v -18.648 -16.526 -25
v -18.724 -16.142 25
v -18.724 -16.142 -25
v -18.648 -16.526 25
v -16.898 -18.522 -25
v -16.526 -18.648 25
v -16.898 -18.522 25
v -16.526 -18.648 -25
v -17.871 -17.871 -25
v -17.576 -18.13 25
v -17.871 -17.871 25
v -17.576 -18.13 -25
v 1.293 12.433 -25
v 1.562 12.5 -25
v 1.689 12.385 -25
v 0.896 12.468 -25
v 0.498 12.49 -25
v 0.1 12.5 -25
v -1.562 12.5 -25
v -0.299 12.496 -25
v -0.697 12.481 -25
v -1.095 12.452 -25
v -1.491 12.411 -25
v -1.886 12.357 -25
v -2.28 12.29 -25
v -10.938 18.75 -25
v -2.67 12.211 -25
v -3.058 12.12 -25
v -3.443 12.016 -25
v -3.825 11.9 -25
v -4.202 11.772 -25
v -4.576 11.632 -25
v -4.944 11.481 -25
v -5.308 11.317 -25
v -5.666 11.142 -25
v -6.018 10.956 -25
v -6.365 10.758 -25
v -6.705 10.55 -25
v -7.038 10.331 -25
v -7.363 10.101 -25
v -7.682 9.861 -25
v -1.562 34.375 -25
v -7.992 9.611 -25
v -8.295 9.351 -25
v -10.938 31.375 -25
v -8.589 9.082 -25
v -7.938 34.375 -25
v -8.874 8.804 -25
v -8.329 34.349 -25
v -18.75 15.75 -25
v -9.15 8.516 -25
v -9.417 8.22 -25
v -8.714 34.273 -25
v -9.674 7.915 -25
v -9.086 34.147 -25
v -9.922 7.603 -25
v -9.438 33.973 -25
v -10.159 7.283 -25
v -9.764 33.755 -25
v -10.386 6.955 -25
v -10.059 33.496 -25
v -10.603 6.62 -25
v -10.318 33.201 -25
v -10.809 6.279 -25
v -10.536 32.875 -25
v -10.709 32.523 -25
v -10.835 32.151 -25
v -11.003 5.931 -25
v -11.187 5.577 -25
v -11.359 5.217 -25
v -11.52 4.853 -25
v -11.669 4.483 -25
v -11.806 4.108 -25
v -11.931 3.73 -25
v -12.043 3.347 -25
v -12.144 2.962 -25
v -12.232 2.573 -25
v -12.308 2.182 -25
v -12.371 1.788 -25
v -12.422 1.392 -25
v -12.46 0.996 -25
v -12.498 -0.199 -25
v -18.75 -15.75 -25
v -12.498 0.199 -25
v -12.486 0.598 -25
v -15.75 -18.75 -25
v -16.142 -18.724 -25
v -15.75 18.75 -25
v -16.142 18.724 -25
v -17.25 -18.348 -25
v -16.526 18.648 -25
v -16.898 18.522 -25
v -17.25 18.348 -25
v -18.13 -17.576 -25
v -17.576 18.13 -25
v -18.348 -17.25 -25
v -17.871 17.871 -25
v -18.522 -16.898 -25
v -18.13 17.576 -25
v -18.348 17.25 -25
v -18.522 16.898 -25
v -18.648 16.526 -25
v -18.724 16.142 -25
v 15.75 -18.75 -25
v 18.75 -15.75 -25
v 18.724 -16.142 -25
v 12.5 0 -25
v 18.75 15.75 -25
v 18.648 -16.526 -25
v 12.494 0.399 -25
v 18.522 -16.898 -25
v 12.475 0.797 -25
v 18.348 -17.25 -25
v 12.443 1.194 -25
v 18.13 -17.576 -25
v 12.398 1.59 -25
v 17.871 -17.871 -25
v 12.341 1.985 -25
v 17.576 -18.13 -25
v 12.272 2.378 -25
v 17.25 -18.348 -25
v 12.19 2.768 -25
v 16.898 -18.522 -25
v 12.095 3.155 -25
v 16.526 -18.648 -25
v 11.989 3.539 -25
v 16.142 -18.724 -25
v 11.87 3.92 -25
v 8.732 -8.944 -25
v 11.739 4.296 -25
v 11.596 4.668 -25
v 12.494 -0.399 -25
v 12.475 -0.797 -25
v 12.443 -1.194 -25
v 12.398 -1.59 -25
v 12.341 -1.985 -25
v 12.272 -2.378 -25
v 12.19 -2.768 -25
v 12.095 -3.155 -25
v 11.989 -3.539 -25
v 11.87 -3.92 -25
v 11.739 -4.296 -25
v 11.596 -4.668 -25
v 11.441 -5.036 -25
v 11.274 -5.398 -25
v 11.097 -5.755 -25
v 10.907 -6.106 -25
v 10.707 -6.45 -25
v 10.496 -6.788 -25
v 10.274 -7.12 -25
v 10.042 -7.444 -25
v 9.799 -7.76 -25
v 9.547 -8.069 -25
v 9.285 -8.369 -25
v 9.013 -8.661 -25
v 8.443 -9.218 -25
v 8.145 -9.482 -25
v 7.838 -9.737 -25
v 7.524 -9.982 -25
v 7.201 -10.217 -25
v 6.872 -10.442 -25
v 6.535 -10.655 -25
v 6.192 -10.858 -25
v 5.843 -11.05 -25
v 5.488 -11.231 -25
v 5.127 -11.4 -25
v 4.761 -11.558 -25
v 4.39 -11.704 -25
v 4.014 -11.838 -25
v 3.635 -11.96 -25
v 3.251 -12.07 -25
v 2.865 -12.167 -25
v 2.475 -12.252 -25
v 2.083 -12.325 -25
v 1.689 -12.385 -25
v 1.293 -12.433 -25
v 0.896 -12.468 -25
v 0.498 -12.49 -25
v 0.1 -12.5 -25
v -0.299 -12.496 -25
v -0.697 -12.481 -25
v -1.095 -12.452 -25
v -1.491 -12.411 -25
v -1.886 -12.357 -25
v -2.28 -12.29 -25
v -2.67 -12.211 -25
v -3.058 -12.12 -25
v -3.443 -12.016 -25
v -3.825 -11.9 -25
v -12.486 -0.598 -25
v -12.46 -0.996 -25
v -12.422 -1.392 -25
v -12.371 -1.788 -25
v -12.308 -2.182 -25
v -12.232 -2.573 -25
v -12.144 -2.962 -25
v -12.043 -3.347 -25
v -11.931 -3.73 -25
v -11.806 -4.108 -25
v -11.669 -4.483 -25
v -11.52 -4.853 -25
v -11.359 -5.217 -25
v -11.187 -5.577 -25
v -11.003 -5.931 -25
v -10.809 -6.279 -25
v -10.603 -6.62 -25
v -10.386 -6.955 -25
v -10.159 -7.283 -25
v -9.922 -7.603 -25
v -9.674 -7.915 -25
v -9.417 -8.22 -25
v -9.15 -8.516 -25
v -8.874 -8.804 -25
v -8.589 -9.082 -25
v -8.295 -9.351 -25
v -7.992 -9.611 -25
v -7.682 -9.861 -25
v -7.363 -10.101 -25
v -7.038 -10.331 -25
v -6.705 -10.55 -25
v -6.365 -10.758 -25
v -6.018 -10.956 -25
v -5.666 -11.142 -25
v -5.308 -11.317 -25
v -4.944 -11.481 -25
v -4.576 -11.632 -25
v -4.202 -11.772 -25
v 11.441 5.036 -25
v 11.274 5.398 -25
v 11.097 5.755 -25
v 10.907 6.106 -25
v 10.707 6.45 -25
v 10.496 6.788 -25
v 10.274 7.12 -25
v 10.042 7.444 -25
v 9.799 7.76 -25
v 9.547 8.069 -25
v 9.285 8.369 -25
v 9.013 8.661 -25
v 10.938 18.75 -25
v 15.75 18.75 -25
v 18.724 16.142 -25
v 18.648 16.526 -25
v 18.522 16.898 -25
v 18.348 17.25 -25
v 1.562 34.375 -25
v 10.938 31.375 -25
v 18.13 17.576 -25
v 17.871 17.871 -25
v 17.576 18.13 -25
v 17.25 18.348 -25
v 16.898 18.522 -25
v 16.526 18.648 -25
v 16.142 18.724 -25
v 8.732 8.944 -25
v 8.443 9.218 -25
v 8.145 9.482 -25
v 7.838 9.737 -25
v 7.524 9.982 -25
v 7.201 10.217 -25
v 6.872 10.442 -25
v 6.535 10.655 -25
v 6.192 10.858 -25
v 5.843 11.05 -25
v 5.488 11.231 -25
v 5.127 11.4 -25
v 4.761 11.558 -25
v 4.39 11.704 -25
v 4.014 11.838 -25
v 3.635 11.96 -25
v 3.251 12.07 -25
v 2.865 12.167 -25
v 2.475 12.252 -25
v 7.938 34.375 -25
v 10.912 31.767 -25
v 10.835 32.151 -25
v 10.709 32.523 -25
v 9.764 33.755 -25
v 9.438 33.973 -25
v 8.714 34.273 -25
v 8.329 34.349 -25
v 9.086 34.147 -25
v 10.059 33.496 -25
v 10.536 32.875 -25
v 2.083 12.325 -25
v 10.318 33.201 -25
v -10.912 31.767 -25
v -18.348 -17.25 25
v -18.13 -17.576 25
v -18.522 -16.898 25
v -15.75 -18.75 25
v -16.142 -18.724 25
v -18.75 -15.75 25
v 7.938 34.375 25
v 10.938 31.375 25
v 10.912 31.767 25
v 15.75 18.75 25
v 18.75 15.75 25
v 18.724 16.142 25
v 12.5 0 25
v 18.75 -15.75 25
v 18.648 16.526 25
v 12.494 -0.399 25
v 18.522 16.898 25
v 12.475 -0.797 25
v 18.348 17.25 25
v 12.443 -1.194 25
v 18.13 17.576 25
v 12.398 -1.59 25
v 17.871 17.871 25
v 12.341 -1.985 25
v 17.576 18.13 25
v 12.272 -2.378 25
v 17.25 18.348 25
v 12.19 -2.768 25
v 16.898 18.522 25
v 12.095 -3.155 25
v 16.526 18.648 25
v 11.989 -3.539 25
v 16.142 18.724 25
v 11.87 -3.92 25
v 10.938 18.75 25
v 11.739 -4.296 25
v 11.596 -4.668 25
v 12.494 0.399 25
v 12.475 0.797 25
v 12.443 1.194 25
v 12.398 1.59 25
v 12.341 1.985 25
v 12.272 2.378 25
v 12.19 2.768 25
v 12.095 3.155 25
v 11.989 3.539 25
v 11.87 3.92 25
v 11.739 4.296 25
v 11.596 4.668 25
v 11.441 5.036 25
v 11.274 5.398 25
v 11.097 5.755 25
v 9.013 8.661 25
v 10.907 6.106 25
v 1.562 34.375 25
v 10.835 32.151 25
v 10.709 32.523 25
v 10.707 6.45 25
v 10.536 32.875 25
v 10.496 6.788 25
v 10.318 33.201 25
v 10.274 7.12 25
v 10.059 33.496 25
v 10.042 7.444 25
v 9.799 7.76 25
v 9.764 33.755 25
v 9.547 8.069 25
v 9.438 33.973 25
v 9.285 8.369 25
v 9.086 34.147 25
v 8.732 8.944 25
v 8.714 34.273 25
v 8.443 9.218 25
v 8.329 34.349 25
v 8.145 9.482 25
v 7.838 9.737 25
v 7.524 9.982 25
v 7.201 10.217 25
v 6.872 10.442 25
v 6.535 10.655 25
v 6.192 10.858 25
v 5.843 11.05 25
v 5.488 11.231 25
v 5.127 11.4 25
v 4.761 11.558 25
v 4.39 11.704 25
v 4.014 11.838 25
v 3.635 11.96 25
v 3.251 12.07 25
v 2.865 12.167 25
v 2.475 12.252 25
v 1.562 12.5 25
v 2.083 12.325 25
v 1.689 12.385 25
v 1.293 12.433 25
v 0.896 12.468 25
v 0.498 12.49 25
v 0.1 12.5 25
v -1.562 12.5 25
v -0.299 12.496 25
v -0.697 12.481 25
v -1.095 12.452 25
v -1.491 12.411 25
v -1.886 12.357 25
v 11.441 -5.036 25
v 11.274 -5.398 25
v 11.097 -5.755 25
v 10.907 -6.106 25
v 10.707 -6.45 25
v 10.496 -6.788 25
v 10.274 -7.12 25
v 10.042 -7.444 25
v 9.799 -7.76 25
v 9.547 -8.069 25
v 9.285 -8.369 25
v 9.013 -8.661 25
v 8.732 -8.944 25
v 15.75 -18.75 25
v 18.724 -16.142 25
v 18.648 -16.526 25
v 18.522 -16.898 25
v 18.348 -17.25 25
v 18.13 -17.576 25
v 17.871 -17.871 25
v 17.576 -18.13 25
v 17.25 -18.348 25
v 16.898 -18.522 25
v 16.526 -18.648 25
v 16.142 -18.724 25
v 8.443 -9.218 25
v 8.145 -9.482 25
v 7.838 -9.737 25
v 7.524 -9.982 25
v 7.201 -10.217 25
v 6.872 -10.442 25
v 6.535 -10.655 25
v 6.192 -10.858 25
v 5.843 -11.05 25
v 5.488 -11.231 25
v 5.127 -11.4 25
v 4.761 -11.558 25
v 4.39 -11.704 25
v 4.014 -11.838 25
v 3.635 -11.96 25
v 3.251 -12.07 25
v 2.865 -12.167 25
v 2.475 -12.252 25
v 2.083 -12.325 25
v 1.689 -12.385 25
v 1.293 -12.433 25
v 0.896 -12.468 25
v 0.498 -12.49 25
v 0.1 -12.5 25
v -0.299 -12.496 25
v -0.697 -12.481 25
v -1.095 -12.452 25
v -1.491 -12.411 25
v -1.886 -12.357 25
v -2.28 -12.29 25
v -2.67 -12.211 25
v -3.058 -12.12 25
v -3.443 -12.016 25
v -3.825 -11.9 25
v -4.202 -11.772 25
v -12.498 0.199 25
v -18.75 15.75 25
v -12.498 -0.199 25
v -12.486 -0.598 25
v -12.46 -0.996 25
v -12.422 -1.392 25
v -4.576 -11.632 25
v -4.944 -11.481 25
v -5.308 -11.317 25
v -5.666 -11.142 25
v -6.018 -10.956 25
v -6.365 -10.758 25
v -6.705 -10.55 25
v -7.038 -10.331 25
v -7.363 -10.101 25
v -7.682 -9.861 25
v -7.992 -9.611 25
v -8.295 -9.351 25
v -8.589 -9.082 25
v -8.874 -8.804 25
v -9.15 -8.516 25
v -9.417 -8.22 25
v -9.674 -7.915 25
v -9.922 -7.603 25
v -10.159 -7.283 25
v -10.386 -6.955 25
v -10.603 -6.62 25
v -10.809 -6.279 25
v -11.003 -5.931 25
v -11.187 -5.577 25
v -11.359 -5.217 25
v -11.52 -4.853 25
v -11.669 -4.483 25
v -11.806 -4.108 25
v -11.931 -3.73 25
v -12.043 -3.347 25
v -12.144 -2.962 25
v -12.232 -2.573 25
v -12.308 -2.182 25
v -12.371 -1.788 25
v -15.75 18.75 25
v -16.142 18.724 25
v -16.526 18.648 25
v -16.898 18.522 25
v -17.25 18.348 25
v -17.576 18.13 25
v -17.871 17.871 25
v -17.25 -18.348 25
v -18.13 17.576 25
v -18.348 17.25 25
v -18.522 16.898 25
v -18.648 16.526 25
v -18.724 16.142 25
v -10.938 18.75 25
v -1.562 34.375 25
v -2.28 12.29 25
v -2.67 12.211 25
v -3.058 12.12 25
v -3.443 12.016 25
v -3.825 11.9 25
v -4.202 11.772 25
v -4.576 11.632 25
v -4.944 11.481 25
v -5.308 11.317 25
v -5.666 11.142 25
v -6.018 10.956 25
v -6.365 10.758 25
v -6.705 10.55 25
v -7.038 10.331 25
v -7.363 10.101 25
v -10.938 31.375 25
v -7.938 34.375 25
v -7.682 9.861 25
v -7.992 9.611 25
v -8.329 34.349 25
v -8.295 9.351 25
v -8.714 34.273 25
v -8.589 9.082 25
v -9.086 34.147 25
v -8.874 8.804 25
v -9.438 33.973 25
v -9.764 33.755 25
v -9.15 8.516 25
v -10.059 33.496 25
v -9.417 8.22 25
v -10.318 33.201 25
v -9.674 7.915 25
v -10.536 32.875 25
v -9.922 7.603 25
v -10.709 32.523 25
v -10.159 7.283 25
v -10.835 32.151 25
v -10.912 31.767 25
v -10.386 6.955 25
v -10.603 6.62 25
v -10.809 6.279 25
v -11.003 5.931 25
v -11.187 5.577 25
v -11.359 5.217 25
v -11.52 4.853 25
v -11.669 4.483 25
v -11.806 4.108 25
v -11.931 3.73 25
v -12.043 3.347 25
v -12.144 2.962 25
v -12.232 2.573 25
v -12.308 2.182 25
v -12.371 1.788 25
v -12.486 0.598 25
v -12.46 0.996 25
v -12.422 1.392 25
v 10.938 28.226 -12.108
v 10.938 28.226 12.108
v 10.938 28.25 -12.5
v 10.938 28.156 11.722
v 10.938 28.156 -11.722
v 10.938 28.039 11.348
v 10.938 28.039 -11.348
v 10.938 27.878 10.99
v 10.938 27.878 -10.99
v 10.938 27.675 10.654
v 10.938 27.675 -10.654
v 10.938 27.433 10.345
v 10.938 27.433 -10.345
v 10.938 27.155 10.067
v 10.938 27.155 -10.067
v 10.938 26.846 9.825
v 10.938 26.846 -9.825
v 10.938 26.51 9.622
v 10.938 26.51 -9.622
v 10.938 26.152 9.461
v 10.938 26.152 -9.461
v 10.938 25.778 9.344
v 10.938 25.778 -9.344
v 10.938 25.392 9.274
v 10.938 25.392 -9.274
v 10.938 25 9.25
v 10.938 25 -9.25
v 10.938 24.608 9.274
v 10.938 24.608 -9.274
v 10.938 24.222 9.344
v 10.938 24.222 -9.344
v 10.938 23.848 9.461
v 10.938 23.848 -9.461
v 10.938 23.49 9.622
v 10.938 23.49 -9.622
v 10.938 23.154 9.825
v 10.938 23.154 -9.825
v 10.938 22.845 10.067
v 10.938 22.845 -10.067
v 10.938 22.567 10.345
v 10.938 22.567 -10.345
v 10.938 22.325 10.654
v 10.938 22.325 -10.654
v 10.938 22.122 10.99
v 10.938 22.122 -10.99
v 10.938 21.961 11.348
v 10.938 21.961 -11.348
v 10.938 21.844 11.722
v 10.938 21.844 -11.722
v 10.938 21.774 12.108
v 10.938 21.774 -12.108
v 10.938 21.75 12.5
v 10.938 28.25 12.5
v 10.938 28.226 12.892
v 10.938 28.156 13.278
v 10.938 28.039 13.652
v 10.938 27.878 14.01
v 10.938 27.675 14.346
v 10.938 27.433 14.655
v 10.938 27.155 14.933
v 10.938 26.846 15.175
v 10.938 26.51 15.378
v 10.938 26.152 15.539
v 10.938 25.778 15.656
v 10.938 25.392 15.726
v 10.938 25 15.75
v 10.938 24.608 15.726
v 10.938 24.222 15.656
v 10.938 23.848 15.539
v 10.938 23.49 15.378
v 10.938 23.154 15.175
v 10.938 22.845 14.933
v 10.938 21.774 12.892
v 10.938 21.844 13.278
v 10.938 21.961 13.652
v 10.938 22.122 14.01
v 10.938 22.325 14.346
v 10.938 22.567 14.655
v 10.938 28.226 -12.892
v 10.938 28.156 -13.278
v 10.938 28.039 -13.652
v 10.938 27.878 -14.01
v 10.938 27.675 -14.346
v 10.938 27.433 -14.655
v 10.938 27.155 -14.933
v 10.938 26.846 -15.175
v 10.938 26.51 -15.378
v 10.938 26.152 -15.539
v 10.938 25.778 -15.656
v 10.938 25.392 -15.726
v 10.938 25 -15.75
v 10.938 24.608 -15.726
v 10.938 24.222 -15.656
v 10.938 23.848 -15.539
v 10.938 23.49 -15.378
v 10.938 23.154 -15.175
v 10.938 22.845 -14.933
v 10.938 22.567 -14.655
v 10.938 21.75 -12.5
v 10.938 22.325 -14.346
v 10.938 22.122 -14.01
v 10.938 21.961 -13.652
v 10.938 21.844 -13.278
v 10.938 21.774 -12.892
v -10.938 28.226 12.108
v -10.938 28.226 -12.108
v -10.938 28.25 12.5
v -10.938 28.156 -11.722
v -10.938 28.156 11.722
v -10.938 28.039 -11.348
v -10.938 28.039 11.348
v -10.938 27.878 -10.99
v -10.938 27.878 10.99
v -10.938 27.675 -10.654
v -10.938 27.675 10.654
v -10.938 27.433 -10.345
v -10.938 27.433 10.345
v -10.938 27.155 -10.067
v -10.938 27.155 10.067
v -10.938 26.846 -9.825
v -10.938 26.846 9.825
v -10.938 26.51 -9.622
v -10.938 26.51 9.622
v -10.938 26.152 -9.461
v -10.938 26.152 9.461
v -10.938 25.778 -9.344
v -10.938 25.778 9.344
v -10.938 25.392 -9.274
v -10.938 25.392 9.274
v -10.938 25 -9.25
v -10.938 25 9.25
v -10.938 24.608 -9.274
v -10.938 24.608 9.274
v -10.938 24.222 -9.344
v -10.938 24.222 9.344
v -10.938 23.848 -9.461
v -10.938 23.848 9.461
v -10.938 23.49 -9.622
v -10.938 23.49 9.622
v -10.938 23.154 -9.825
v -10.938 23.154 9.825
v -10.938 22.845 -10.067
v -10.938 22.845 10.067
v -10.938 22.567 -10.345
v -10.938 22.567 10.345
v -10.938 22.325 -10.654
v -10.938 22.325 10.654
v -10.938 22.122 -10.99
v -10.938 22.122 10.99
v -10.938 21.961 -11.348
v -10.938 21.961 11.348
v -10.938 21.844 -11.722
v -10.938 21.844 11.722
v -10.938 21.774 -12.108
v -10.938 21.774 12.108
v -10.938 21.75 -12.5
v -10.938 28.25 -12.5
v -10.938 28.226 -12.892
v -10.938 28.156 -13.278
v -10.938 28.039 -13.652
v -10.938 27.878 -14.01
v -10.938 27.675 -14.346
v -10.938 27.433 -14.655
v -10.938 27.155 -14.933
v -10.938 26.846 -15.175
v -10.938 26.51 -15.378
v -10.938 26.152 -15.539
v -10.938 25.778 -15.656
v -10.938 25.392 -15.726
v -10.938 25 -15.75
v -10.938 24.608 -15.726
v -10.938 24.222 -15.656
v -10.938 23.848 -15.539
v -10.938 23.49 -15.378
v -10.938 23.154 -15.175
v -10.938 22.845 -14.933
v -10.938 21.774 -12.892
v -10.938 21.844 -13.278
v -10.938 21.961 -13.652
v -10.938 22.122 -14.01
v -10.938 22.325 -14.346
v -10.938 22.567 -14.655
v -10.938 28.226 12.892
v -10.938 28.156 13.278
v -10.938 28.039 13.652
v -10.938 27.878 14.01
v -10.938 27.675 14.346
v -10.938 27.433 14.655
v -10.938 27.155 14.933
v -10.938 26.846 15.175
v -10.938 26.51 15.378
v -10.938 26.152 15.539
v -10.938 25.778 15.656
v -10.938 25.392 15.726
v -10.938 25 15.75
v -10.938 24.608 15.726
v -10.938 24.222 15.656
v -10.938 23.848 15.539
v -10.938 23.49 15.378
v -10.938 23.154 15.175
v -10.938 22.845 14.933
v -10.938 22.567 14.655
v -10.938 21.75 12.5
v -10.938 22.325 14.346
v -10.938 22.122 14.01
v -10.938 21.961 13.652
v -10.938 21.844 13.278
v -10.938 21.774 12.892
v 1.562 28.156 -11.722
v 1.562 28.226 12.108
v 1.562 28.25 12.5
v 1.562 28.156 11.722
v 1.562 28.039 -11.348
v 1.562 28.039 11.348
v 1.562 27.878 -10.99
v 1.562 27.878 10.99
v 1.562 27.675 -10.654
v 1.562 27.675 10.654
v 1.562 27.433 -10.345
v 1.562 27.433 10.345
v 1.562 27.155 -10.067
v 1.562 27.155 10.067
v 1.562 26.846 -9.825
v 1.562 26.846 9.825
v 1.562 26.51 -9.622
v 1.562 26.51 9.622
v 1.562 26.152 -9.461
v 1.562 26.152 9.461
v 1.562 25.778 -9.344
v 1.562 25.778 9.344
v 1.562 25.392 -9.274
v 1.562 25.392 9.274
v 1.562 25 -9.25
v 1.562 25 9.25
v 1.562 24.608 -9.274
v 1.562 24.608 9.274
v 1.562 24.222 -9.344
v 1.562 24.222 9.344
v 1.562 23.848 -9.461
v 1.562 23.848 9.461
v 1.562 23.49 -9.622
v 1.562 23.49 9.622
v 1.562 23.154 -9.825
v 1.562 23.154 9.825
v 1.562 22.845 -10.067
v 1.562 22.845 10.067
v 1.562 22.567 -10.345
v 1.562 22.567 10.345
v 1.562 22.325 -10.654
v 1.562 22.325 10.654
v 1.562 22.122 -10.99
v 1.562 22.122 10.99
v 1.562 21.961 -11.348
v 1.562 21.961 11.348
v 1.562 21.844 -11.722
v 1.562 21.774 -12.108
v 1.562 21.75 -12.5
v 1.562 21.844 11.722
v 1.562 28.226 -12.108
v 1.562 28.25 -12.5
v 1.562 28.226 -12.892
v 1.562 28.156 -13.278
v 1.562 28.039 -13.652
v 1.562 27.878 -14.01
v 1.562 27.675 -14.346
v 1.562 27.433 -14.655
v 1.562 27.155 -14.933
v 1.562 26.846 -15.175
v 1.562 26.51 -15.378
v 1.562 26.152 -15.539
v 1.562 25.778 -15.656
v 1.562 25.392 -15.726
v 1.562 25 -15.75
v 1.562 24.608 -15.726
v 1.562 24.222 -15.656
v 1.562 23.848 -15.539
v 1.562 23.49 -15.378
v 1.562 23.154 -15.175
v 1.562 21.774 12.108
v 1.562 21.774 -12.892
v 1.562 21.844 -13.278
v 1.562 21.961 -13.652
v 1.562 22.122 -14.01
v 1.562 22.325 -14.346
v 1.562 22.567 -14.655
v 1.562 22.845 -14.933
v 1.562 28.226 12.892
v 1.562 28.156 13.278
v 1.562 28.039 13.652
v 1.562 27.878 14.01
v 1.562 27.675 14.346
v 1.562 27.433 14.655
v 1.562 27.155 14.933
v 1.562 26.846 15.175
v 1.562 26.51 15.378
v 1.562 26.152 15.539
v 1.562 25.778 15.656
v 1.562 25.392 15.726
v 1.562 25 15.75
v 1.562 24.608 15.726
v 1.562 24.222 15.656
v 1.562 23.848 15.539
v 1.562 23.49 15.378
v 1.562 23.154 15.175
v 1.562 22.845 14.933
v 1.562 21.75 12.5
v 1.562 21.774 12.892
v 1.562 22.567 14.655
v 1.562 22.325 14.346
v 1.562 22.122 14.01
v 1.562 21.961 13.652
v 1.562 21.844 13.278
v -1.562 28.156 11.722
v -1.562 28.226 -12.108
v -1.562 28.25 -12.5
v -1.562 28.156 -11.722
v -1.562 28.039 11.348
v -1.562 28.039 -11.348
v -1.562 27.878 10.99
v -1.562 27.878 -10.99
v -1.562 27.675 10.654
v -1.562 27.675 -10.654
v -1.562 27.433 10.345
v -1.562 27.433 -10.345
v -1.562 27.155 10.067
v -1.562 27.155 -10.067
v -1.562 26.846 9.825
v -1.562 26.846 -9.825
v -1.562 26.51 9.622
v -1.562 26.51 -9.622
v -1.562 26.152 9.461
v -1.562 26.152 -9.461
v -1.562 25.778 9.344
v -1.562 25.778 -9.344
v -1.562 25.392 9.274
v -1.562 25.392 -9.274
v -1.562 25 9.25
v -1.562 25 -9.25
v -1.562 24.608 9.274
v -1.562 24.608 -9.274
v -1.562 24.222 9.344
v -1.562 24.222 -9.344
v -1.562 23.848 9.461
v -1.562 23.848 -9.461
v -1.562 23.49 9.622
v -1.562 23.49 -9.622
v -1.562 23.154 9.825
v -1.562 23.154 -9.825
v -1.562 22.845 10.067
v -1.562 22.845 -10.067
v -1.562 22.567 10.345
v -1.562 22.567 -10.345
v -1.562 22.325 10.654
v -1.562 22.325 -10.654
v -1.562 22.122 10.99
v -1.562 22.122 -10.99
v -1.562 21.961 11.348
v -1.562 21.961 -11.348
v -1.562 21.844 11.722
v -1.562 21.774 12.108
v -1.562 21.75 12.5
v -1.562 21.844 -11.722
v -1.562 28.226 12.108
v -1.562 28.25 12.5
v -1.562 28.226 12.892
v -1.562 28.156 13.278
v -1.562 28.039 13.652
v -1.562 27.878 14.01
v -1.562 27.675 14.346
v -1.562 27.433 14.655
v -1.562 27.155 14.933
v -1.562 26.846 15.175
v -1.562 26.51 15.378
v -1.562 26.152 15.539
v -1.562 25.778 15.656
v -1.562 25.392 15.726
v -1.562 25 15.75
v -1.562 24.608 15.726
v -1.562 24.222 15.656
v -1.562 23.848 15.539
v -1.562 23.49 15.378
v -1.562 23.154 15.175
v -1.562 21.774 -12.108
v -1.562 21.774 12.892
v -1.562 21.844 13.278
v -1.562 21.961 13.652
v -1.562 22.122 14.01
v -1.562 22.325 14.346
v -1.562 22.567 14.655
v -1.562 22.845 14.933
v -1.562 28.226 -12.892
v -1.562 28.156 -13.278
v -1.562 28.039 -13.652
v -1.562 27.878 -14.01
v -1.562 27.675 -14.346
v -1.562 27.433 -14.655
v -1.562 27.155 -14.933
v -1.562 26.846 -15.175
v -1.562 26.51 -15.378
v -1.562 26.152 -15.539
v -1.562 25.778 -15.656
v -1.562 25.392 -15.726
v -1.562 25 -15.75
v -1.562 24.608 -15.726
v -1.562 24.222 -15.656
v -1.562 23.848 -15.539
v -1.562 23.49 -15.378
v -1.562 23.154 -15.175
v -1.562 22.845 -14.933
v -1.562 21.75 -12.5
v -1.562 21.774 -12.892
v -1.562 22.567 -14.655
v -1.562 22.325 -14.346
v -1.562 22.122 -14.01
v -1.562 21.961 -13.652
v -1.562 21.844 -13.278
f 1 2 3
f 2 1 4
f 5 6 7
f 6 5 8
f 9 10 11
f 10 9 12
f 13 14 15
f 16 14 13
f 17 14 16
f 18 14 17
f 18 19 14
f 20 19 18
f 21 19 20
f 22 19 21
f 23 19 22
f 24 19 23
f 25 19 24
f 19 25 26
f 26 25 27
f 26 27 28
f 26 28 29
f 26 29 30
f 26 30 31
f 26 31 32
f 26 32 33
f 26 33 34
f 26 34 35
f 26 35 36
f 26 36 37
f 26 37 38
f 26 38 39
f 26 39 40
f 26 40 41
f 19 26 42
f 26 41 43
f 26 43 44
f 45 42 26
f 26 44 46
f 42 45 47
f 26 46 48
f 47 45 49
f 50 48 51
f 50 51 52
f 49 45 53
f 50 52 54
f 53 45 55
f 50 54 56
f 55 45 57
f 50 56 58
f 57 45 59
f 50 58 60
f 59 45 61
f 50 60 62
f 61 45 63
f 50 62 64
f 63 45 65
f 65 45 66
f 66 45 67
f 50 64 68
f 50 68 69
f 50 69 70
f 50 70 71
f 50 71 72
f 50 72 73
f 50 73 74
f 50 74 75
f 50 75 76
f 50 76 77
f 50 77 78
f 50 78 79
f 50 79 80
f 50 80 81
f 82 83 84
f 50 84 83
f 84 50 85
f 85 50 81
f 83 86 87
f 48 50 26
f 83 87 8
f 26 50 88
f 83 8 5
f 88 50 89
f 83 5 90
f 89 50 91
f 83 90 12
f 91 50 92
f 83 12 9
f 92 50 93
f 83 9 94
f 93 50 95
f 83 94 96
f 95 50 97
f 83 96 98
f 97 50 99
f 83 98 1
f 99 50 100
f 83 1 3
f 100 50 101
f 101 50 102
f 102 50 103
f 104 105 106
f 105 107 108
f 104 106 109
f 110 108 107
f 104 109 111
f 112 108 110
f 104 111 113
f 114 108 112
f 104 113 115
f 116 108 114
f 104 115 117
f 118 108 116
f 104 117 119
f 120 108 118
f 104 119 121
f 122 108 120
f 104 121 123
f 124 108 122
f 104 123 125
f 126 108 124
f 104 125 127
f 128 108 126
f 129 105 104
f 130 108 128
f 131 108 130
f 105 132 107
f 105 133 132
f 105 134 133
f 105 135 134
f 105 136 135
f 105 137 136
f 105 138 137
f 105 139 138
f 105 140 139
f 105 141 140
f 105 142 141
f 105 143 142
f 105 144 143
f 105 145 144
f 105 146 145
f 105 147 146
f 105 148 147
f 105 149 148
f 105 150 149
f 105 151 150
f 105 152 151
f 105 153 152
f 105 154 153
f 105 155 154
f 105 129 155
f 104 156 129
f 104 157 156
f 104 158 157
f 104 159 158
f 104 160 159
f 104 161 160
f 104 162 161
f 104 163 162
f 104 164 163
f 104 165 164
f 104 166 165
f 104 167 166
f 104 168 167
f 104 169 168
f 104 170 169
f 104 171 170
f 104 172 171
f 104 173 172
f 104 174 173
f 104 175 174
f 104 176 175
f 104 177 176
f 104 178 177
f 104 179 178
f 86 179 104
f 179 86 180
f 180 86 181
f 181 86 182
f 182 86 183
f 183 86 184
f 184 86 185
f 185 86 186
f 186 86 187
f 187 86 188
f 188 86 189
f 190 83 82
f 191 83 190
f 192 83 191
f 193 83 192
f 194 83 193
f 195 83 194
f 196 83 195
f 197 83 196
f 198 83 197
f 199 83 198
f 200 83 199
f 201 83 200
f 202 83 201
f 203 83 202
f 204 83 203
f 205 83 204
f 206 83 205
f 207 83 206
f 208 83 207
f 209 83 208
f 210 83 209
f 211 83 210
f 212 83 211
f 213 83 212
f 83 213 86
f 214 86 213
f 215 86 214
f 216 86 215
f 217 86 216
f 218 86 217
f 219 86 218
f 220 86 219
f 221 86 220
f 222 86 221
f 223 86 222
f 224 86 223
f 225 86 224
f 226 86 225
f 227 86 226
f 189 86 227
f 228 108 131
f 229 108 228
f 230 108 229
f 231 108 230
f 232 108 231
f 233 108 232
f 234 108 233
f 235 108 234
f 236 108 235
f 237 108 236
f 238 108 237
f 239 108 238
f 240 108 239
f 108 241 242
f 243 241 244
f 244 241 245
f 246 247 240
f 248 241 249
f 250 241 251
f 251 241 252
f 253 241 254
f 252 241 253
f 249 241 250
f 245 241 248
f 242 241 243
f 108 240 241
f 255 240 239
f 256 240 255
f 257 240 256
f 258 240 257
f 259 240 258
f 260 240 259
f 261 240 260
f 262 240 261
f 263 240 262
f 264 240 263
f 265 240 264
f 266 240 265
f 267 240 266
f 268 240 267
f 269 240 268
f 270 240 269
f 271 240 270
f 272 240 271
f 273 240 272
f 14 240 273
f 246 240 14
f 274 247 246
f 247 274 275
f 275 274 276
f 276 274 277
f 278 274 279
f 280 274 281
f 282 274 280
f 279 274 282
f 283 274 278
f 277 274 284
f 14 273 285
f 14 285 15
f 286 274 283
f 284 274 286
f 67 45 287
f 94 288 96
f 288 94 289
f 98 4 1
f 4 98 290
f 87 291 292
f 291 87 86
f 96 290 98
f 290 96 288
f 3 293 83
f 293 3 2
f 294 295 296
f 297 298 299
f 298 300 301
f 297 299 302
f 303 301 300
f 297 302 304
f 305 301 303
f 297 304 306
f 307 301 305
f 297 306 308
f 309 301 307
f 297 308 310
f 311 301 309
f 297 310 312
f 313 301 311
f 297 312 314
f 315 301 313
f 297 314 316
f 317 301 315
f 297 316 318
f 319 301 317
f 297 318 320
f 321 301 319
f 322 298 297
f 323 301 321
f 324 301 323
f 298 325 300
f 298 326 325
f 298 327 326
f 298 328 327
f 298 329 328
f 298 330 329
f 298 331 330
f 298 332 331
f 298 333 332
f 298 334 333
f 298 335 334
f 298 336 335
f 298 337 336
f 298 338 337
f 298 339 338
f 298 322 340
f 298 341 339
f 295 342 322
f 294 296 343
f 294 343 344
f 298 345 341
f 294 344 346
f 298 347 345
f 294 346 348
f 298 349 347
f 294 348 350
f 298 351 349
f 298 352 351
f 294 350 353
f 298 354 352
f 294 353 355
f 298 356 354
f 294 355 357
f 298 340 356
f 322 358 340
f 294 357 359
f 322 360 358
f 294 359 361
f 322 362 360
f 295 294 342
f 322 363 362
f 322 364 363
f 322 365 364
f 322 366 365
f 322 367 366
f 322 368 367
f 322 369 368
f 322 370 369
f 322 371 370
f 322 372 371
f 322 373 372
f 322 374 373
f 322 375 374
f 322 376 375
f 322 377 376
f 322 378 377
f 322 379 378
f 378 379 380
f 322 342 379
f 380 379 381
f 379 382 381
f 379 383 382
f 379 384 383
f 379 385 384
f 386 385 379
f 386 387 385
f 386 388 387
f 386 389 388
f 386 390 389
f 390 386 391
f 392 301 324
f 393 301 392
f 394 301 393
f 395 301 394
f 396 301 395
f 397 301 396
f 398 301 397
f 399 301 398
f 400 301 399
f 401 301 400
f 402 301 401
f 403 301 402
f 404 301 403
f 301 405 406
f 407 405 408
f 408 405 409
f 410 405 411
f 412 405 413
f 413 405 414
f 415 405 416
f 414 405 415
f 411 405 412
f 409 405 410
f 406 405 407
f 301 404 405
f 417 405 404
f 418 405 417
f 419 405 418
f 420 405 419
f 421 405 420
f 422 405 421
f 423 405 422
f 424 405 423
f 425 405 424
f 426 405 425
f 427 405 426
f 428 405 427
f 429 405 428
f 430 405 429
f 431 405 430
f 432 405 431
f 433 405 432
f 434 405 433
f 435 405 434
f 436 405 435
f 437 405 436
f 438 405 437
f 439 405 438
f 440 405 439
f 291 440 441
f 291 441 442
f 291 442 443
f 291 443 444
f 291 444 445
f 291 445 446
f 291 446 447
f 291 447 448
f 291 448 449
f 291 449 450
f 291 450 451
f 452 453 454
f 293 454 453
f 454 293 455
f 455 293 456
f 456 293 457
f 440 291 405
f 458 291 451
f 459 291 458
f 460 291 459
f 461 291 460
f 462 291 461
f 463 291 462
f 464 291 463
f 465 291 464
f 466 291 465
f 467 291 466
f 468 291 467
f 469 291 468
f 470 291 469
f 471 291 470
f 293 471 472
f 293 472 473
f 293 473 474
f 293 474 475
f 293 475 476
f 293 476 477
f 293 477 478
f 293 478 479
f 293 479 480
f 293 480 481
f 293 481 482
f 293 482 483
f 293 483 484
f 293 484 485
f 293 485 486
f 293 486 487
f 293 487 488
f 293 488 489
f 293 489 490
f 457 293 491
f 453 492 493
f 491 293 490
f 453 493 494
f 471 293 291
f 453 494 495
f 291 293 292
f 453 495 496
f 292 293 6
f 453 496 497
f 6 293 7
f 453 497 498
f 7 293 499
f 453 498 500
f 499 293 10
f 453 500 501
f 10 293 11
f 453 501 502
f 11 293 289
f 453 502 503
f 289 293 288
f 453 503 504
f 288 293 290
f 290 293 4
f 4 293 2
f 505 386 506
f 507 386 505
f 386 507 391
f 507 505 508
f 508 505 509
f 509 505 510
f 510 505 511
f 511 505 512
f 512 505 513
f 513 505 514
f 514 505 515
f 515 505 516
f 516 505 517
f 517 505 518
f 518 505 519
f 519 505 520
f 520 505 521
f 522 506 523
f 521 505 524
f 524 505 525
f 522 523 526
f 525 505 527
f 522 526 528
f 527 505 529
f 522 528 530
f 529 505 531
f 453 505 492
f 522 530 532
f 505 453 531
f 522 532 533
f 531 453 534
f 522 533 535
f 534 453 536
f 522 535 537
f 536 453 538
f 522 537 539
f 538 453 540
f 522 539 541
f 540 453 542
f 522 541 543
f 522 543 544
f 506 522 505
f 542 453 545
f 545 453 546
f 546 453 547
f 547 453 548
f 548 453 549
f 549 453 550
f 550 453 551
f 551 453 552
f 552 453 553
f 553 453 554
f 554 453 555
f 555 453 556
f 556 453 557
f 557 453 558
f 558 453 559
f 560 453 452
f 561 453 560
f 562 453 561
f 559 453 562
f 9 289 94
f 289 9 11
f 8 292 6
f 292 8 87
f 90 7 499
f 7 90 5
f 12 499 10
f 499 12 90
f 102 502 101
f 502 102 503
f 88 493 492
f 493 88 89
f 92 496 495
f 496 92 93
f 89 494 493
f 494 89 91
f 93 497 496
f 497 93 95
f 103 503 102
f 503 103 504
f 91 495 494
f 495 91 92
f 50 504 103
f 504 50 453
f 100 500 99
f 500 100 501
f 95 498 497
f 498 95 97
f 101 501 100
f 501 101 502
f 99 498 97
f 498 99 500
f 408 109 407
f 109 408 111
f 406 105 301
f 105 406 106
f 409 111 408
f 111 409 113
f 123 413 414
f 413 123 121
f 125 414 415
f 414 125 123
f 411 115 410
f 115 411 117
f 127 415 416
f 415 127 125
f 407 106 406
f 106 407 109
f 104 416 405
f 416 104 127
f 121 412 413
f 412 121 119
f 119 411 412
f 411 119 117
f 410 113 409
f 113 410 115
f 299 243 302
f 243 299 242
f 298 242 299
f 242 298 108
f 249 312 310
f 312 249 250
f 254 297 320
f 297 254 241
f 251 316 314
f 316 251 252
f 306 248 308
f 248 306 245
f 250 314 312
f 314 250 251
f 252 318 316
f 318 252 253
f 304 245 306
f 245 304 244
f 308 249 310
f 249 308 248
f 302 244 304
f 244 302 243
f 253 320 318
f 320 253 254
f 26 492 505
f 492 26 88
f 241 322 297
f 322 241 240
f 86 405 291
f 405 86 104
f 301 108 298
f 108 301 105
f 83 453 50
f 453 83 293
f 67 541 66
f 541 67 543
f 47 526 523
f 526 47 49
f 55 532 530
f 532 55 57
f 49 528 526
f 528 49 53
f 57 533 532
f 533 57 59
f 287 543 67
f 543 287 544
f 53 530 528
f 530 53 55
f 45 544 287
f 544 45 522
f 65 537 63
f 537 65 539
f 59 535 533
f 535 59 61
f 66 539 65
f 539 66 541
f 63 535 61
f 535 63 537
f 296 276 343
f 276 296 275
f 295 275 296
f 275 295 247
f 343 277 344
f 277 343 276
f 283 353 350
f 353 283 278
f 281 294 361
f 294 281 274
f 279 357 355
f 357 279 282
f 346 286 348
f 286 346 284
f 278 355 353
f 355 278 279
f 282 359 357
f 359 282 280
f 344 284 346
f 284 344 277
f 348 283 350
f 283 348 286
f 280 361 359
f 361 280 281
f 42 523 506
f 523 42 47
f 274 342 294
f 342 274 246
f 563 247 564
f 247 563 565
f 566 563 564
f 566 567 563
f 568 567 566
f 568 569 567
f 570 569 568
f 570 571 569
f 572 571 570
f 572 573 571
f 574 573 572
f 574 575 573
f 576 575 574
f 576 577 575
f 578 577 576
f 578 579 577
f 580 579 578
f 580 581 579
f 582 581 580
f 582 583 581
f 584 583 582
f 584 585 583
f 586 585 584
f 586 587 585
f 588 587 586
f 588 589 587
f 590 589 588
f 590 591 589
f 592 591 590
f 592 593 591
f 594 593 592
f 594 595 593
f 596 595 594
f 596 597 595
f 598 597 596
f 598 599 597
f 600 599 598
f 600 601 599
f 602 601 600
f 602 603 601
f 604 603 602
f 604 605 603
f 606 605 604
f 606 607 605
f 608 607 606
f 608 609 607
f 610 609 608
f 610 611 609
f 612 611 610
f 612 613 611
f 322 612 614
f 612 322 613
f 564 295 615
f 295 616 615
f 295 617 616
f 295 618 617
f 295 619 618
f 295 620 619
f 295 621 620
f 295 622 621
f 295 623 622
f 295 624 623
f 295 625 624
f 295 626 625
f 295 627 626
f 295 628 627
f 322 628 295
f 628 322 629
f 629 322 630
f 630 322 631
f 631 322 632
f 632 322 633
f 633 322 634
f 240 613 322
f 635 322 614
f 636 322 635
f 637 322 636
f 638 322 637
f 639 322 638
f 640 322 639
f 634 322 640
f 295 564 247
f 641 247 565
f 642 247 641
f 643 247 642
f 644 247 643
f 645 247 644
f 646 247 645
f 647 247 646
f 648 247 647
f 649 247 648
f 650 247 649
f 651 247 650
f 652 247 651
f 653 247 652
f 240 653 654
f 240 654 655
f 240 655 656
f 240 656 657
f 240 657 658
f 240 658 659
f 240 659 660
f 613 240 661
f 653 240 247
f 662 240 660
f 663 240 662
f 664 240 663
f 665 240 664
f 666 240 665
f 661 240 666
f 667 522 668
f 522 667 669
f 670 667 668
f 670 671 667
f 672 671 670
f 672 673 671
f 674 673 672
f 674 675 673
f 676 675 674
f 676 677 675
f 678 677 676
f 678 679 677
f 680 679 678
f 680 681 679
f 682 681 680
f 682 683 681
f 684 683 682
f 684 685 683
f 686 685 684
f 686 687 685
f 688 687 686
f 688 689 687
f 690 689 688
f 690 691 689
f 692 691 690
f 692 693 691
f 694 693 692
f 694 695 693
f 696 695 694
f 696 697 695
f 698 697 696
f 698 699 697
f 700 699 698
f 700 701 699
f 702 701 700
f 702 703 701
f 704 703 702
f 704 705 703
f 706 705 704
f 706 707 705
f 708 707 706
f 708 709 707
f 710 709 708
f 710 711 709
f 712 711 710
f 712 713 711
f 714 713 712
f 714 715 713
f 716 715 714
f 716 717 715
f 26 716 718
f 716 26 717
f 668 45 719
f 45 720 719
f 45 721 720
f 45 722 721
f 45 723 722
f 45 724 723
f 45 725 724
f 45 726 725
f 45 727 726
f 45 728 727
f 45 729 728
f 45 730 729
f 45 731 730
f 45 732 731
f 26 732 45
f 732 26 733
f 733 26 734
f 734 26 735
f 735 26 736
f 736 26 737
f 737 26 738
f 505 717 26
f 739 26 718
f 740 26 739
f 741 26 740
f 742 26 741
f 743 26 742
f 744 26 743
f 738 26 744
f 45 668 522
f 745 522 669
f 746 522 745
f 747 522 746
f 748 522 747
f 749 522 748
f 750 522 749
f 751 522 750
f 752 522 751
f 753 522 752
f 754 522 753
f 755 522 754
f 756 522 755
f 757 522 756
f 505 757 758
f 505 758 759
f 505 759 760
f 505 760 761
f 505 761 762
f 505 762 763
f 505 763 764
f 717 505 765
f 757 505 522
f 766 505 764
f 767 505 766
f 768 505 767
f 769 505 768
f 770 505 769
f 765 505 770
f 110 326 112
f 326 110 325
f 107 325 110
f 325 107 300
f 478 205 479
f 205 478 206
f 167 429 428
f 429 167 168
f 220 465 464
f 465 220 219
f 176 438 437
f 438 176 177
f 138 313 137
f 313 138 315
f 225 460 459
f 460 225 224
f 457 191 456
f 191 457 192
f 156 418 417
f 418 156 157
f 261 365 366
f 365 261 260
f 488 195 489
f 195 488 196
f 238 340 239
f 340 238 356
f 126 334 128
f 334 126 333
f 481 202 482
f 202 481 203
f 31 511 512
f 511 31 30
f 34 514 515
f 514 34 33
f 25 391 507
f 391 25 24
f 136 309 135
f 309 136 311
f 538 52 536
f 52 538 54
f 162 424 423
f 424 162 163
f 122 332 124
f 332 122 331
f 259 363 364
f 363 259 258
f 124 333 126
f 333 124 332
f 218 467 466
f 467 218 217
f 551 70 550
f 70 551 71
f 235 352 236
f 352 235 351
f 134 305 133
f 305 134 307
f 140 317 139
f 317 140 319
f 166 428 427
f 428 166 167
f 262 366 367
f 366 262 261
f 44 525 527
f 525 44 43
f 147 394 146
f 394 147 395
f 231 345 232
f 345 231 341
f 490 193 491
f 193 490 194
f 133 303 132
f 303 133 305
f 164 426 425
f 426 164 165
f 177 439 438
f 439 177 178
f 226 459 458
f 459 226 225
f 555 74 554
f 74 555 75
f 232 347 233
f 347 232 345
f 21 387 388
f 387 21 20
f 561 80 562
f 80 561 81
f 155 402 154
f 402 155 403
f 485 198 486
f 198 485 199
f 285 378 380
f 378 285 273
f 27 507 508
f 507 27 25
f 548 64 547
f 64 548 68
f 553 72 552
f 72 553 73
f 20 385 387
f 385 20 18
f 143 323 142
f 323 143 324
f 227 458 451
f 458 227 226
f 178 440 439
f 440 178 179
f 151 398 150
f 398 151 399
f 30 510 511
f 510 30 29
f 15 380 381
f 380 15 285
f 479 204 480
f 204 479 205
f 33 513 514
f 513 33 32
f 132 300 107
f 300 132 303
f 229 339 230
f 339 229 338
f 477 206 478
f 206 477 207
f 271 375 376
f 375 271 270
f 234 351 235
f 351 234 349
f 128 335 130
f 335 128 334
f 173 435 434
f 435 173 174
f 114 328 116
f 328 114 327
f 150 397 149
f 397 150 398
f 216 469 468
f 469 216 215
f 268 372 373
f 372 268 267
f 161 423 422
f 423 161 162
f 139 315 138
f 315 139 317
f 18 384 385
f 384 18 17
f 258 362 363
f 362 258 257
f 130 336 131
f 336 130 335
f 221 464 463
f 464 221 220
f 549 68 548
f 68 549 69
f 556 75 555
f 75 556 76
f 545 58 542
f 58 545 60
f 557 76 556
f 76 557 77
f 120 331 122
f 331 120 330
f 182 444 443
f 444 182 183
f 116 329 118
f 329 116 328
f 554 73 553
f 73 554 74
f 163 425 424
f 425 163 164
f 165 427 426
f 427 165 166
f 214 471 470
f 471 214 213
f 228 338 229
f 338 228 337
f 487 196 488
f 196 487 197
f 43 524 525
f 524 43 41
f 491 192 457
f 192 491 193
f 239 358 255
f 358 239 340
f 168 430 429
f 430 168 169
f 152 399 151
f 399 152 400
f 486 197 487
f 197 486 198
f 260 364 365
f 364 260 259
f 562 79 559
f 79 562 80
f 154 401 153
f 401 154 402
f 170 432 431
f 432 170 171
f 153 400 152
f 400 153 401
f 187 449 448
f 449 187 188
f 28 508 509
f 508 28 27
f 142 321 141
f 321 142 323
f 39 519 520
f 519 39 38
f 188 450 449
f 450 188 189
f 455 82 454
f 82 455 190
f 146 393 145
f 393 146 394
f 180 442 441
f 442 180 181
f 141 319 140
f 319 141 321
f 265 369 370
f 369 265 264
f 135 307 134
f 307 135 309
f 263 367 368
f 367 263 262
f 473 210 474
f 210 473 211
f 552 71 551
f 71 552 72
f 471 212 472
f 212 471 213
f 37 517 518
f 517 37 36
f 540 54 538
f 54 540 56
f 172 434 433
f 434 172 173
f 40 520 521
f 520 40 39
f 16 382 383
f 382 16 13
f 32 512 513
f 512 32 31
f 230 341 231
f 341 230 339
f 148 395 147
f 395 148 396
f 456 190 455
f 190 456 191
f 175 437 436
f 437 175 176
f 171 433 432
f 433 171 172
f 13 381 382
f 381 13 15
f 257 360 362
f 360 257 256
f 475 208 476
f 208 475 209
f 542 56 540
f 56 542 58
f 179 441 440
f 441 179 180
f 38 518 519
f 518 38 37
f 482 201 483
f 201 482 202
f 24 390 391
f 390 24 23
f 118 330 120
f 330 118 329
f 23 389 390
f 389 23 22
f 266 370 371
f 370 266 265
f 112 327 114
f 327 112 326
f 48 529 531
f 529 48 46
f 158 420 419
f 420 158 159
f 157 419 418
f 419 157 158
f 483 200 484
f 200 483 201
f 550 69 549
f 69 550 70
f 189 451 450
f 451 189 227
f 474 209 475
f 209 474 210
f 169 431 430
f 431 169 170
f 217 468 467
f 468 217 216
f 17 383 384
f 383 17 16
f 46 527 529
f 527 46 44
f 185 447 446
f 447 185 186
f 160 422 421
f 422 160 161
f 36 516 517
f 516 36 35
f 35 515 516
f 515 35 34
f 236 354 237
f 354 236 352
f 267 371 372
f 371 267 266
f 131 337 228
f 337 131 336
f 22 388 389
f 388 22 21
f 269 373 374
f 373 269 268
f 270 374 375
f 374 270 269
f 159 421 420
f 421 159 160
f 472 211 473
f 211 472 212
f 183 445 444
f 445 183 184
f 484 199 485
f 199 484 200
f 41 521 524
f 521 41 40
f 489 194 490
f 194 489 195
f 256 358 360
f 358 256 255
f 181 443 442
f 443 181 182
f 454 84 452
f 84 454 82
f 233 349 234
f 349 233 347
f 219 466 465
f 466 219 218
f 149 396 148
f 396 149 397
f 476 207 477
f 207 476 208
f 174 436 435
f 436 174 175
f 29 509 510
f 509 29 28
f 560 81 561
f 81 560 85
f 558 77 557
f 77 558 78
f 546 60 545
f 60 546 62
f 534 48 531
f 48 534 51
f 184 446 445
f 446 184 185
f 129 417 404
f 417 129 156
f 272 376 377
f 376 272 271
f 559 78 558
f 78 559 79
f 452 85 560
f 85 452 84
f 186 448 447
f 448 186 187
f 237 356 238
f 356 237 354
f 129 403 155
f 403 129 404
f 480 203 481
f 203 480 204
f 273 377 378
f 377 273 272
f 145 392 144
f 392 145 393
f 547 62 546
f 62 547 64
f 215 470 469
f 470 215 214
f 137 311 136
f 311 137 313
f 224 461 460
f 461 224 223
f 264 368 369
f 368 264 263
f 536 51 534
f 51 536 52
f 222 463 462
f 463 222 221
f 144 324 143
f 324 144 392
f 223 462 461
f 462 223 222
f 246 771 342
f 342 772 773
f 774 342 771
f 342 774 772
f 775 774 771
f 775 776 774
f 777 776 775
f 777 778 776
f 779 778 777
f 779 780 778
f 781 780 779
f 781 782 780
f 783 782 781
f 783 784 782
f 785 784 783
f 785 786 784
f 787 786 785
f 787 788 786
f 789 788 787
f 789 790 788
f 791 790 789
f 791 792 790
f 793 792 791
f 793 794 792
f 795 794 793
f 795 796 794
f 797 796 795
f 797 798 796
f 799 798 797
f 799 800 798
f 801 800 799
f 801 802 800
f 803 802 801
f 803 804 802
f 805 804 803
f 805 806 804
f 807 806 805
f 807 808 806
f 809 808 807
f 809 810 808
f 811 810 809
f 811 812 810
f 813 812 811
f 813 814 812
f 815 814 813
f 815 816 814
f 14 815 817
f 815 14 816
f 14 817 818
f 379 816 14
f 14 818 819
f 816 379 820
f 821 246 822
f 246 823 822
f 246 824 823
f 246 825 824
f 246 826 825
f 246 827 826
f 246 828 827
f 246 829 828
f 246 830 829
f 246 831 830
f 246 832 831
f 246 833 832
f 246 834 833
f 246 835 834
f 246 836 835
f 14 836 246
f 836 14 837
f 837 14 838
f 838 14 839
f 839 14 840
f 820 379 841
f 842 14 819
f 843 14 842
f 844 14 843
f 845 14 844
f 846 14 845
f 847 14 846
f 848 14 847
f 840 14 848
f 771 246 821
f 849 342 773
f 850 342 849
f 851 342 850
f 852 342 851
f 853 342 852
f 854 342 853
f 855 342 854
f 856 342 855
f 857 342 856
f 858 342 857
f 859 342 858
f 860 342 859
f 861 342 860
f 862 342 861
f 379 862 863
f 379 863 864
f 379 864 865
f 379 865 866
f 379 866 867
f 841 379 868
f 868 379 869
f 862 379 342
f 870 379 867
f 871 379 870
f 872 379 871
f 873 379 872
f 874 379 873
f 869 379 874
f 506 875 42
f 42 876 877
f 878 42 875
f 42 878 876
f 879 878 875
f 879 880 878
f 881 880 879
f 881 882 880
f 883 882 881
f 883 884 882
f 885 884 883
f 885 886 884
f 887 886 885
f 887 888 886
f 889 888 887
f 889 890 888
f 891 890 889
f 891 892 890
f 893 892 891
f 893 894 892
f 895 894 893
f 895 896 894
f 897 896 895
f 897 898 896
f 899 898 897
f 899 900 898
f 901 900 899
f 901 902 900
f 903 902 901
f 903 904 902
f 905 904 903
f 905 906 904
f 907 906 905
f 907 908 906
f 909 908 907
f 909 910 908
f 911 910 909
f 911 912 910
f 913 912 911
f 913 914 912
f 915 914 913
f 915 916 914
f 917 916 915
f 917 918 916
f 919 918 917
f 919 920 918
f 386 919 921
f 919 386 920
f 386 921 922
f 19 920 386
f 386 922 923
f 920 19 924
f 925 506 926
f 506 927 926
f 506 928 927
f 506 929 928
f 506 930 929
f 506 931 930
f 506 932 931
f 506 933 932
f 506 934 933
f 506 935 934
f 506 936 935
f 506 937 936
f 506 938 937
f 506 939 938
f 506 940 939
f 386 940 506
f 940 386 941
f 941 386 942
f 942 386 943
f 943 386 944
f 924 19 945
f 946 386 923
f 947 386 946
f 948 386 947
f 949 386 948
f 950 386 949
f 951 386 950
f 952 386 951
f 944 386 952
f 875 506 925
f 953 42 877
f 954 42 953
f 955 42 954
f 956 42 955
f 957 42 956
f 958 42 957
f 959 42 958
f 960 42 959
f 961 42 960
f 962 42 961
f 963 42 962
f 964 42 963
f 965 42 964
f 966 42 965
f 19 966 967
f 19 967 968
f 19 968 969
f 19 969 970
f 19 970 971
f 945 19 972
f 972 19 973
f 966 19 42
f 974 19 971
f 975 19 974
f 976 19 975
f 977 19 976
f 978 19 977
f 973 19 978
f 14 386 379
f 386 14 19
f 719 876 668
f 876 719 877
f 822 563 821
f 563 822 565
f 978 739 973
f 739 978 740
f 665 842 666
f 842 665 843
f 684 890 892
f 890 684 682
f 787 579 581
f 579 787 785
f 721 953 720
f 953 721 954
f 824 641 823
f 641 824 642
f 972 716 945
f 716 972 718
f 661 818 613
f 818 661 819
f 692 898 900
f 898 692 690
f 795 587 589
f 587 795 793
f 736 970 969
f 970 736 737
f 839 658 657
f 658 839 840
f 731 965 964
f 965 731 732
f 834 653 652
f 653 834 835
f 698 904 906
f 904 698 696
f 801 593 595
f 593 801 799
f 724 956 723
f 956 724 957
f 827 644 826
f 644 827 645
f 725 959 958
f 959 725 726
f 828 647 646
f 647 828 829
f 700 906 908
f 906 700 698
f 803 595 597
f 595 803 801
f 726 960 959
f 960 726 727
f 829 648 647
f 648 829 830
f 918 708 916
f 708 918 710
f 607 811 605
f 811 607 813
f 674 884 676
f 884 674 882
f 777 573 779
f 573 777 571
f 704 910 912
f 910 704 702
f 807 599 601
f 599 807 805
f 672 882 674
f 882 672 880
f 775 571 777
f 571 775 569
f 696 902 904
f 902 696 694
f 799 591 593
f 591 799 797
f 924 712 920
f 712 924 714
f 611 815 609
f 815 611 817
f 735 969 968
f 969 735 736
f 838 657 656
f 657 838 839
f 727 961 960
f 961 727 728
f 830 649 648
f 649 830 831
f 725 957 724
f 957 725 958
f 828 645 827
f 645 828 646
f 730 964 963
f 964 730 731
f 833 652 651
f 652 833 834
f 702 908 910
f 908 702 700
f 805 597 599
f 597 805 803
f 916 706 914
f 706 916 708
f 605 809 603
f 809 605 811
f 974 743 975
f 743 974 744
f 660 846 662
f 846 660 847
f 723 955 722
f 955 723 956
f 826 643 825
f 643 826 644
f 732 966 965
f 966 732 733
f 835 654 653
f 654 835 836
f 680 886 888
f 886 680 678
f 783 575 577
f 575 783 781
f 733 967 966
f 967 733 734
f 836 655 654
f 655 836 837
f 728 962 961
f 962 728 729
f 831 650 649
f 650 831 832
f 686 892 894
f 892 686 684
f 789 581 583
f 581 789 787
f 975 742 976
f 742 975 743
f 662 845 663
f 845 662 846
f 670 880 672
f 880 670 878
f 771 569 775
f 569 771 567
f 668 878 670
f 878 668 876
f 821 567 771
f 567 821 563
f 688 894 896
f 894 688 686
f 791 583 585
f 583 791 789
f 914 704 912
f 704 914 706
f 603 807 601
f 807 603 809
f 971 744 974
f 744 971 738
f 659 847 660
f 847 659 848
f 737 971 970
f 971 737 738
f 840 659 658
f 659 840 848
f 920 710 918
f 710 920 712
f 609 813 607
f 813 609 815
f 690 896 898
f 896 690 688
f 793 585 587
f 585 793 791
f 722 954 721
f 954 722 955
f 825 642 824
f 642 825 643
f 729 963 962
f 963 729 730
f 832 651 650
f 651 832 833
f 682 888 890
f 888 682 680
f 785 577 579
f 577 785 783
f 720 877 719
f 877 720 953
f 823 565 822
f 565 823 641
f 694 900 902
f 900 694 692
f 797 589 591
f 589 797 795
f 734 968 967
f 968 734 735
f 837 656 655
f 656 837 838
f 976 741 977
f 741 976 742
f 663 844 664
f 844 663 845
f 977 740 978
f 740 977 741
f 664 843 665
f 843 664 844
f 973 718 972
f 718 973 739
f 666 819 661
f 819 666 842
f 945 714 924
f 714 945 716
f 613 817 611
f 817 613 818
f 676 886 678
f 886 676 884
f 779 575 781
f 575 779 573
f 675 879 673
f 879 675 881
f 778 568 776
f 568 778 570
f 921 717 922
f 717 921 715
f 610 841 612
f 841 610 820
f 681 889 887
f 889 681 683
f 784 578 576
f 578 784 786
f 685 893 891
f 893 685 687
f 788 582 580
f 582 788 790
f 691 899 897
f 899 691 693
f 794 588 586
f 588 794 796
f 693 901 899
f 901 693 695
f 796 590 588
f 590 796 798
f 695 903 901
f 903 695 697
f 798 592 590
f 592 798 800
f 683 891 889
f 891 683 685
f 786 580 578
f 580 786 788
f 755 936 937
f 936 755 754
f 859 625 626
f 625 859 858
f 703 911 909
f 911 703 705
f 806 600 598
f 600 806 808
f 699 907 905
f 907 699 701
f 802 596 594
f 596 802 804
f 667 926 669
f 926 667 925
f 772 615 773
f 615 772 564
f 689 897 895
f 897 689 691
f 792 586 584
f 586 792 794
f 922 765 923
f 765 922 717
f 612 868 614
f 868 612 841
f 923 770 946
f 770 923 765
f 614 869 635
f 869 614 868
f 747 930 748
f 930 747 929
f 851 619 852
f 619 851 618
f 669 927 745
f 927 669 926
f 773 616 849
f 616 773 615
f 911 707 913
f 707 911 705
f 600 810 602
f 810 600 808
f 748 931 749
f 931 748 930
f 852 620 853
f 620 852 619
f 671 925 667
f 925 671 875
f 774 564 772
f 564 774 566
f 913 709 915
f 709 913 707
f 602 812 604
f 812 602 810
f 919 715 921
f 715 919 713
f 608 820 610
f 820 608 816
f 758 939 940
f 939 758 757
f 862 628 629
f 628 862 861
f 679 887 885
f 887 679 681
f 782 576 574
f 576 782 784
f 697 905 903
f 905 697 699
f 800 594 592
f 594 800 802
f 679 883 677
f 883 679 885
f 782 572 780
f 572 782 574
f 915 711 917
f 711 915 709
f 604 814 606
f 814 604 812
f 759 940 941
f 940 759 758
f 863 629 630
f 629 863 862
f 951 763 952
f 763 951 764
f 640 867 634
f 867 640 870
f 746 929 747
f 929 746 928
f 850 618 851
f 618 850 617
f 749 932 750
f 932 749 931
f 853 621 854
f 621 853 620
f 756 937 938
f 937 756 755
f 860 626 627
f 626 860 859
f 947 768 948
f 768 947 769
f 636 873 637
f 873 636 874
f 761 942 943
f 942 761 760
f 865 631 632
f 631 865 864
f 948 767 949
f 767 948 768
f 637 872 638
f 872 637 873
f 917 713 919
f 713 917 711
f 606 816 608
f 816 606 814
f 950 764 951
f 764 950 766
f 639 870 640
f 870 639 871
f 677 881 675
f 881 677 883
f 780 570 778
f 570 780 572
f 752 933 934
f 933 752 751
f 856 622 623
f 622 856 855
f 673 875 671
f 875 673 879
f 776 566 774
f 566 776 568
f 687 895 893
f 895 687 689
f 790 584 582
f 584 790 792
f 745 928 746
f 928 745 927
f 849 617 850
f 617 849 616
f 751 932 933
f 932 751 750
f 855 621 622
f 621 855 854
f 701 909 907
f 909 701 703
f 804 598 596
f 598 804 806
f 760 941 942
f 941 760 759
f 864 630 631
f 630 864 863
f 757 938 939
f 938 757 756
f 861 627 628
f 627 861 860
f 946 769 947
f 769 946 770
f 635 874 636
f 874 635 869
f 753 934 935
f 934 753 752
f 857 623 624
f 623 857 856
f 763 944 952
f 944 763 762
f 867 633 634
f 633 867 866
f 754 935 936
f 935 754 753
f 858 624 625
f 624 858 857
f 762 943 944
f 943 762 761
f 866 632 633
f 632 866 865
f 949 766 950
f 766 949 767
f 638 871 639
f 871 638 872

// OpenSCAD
// all units are in 'mm'
use <MCAD/boxes.scad>

$fa=1;
$fs=0.4;


module mounting_block (desk_angle=0, pole_thickness=12.5) {

  rotate ([desk_angle, 0, 0])
    difference () {

    difference () {

      difference () {

        union () {

          // Main Body
          roundedBox (size=[(pole_thickness * 3), (pole_thickness * 3), (pole_thickness * 4)],  radius=3, sidesonly=true);

          // Tension Plate
          translate ([0, pole_thickness * 1.75, 0])
            roundedBox (size=[(pole_thickness * 1.75), (pole_thickness * 2), (pole_thickness * 4)], radius=3, sidesonly=true);
        }

        // Mounting Pole
        cylinder (r=pole_thickness, h=(pole_thickness * 20), center=true);
      }

      // Gap for compression
      translate ([0, pole_thickness * 2, 0])
        cube ([(pole_thickness * 0.25), (pole_thickness * 2), (pole_thickness * 5)], center=true);

    }

    // Top screw hole
    rotate ([0, 90, 0])
      translate ([pole_thickness, (pole_thickness * 2), 0])
      cylinder (r=3.25, h=(pole_thickness * 2.5), center=true);

    // Bottom screw hole
    rotate ([0, 90, 0])
      translate ([-pole_thickness, (pole_thickness * 2), 0])
      cylinder (r=3.25, h=(pole_thickness * 2.5), center=true);

  }
}

mounting_block ();
